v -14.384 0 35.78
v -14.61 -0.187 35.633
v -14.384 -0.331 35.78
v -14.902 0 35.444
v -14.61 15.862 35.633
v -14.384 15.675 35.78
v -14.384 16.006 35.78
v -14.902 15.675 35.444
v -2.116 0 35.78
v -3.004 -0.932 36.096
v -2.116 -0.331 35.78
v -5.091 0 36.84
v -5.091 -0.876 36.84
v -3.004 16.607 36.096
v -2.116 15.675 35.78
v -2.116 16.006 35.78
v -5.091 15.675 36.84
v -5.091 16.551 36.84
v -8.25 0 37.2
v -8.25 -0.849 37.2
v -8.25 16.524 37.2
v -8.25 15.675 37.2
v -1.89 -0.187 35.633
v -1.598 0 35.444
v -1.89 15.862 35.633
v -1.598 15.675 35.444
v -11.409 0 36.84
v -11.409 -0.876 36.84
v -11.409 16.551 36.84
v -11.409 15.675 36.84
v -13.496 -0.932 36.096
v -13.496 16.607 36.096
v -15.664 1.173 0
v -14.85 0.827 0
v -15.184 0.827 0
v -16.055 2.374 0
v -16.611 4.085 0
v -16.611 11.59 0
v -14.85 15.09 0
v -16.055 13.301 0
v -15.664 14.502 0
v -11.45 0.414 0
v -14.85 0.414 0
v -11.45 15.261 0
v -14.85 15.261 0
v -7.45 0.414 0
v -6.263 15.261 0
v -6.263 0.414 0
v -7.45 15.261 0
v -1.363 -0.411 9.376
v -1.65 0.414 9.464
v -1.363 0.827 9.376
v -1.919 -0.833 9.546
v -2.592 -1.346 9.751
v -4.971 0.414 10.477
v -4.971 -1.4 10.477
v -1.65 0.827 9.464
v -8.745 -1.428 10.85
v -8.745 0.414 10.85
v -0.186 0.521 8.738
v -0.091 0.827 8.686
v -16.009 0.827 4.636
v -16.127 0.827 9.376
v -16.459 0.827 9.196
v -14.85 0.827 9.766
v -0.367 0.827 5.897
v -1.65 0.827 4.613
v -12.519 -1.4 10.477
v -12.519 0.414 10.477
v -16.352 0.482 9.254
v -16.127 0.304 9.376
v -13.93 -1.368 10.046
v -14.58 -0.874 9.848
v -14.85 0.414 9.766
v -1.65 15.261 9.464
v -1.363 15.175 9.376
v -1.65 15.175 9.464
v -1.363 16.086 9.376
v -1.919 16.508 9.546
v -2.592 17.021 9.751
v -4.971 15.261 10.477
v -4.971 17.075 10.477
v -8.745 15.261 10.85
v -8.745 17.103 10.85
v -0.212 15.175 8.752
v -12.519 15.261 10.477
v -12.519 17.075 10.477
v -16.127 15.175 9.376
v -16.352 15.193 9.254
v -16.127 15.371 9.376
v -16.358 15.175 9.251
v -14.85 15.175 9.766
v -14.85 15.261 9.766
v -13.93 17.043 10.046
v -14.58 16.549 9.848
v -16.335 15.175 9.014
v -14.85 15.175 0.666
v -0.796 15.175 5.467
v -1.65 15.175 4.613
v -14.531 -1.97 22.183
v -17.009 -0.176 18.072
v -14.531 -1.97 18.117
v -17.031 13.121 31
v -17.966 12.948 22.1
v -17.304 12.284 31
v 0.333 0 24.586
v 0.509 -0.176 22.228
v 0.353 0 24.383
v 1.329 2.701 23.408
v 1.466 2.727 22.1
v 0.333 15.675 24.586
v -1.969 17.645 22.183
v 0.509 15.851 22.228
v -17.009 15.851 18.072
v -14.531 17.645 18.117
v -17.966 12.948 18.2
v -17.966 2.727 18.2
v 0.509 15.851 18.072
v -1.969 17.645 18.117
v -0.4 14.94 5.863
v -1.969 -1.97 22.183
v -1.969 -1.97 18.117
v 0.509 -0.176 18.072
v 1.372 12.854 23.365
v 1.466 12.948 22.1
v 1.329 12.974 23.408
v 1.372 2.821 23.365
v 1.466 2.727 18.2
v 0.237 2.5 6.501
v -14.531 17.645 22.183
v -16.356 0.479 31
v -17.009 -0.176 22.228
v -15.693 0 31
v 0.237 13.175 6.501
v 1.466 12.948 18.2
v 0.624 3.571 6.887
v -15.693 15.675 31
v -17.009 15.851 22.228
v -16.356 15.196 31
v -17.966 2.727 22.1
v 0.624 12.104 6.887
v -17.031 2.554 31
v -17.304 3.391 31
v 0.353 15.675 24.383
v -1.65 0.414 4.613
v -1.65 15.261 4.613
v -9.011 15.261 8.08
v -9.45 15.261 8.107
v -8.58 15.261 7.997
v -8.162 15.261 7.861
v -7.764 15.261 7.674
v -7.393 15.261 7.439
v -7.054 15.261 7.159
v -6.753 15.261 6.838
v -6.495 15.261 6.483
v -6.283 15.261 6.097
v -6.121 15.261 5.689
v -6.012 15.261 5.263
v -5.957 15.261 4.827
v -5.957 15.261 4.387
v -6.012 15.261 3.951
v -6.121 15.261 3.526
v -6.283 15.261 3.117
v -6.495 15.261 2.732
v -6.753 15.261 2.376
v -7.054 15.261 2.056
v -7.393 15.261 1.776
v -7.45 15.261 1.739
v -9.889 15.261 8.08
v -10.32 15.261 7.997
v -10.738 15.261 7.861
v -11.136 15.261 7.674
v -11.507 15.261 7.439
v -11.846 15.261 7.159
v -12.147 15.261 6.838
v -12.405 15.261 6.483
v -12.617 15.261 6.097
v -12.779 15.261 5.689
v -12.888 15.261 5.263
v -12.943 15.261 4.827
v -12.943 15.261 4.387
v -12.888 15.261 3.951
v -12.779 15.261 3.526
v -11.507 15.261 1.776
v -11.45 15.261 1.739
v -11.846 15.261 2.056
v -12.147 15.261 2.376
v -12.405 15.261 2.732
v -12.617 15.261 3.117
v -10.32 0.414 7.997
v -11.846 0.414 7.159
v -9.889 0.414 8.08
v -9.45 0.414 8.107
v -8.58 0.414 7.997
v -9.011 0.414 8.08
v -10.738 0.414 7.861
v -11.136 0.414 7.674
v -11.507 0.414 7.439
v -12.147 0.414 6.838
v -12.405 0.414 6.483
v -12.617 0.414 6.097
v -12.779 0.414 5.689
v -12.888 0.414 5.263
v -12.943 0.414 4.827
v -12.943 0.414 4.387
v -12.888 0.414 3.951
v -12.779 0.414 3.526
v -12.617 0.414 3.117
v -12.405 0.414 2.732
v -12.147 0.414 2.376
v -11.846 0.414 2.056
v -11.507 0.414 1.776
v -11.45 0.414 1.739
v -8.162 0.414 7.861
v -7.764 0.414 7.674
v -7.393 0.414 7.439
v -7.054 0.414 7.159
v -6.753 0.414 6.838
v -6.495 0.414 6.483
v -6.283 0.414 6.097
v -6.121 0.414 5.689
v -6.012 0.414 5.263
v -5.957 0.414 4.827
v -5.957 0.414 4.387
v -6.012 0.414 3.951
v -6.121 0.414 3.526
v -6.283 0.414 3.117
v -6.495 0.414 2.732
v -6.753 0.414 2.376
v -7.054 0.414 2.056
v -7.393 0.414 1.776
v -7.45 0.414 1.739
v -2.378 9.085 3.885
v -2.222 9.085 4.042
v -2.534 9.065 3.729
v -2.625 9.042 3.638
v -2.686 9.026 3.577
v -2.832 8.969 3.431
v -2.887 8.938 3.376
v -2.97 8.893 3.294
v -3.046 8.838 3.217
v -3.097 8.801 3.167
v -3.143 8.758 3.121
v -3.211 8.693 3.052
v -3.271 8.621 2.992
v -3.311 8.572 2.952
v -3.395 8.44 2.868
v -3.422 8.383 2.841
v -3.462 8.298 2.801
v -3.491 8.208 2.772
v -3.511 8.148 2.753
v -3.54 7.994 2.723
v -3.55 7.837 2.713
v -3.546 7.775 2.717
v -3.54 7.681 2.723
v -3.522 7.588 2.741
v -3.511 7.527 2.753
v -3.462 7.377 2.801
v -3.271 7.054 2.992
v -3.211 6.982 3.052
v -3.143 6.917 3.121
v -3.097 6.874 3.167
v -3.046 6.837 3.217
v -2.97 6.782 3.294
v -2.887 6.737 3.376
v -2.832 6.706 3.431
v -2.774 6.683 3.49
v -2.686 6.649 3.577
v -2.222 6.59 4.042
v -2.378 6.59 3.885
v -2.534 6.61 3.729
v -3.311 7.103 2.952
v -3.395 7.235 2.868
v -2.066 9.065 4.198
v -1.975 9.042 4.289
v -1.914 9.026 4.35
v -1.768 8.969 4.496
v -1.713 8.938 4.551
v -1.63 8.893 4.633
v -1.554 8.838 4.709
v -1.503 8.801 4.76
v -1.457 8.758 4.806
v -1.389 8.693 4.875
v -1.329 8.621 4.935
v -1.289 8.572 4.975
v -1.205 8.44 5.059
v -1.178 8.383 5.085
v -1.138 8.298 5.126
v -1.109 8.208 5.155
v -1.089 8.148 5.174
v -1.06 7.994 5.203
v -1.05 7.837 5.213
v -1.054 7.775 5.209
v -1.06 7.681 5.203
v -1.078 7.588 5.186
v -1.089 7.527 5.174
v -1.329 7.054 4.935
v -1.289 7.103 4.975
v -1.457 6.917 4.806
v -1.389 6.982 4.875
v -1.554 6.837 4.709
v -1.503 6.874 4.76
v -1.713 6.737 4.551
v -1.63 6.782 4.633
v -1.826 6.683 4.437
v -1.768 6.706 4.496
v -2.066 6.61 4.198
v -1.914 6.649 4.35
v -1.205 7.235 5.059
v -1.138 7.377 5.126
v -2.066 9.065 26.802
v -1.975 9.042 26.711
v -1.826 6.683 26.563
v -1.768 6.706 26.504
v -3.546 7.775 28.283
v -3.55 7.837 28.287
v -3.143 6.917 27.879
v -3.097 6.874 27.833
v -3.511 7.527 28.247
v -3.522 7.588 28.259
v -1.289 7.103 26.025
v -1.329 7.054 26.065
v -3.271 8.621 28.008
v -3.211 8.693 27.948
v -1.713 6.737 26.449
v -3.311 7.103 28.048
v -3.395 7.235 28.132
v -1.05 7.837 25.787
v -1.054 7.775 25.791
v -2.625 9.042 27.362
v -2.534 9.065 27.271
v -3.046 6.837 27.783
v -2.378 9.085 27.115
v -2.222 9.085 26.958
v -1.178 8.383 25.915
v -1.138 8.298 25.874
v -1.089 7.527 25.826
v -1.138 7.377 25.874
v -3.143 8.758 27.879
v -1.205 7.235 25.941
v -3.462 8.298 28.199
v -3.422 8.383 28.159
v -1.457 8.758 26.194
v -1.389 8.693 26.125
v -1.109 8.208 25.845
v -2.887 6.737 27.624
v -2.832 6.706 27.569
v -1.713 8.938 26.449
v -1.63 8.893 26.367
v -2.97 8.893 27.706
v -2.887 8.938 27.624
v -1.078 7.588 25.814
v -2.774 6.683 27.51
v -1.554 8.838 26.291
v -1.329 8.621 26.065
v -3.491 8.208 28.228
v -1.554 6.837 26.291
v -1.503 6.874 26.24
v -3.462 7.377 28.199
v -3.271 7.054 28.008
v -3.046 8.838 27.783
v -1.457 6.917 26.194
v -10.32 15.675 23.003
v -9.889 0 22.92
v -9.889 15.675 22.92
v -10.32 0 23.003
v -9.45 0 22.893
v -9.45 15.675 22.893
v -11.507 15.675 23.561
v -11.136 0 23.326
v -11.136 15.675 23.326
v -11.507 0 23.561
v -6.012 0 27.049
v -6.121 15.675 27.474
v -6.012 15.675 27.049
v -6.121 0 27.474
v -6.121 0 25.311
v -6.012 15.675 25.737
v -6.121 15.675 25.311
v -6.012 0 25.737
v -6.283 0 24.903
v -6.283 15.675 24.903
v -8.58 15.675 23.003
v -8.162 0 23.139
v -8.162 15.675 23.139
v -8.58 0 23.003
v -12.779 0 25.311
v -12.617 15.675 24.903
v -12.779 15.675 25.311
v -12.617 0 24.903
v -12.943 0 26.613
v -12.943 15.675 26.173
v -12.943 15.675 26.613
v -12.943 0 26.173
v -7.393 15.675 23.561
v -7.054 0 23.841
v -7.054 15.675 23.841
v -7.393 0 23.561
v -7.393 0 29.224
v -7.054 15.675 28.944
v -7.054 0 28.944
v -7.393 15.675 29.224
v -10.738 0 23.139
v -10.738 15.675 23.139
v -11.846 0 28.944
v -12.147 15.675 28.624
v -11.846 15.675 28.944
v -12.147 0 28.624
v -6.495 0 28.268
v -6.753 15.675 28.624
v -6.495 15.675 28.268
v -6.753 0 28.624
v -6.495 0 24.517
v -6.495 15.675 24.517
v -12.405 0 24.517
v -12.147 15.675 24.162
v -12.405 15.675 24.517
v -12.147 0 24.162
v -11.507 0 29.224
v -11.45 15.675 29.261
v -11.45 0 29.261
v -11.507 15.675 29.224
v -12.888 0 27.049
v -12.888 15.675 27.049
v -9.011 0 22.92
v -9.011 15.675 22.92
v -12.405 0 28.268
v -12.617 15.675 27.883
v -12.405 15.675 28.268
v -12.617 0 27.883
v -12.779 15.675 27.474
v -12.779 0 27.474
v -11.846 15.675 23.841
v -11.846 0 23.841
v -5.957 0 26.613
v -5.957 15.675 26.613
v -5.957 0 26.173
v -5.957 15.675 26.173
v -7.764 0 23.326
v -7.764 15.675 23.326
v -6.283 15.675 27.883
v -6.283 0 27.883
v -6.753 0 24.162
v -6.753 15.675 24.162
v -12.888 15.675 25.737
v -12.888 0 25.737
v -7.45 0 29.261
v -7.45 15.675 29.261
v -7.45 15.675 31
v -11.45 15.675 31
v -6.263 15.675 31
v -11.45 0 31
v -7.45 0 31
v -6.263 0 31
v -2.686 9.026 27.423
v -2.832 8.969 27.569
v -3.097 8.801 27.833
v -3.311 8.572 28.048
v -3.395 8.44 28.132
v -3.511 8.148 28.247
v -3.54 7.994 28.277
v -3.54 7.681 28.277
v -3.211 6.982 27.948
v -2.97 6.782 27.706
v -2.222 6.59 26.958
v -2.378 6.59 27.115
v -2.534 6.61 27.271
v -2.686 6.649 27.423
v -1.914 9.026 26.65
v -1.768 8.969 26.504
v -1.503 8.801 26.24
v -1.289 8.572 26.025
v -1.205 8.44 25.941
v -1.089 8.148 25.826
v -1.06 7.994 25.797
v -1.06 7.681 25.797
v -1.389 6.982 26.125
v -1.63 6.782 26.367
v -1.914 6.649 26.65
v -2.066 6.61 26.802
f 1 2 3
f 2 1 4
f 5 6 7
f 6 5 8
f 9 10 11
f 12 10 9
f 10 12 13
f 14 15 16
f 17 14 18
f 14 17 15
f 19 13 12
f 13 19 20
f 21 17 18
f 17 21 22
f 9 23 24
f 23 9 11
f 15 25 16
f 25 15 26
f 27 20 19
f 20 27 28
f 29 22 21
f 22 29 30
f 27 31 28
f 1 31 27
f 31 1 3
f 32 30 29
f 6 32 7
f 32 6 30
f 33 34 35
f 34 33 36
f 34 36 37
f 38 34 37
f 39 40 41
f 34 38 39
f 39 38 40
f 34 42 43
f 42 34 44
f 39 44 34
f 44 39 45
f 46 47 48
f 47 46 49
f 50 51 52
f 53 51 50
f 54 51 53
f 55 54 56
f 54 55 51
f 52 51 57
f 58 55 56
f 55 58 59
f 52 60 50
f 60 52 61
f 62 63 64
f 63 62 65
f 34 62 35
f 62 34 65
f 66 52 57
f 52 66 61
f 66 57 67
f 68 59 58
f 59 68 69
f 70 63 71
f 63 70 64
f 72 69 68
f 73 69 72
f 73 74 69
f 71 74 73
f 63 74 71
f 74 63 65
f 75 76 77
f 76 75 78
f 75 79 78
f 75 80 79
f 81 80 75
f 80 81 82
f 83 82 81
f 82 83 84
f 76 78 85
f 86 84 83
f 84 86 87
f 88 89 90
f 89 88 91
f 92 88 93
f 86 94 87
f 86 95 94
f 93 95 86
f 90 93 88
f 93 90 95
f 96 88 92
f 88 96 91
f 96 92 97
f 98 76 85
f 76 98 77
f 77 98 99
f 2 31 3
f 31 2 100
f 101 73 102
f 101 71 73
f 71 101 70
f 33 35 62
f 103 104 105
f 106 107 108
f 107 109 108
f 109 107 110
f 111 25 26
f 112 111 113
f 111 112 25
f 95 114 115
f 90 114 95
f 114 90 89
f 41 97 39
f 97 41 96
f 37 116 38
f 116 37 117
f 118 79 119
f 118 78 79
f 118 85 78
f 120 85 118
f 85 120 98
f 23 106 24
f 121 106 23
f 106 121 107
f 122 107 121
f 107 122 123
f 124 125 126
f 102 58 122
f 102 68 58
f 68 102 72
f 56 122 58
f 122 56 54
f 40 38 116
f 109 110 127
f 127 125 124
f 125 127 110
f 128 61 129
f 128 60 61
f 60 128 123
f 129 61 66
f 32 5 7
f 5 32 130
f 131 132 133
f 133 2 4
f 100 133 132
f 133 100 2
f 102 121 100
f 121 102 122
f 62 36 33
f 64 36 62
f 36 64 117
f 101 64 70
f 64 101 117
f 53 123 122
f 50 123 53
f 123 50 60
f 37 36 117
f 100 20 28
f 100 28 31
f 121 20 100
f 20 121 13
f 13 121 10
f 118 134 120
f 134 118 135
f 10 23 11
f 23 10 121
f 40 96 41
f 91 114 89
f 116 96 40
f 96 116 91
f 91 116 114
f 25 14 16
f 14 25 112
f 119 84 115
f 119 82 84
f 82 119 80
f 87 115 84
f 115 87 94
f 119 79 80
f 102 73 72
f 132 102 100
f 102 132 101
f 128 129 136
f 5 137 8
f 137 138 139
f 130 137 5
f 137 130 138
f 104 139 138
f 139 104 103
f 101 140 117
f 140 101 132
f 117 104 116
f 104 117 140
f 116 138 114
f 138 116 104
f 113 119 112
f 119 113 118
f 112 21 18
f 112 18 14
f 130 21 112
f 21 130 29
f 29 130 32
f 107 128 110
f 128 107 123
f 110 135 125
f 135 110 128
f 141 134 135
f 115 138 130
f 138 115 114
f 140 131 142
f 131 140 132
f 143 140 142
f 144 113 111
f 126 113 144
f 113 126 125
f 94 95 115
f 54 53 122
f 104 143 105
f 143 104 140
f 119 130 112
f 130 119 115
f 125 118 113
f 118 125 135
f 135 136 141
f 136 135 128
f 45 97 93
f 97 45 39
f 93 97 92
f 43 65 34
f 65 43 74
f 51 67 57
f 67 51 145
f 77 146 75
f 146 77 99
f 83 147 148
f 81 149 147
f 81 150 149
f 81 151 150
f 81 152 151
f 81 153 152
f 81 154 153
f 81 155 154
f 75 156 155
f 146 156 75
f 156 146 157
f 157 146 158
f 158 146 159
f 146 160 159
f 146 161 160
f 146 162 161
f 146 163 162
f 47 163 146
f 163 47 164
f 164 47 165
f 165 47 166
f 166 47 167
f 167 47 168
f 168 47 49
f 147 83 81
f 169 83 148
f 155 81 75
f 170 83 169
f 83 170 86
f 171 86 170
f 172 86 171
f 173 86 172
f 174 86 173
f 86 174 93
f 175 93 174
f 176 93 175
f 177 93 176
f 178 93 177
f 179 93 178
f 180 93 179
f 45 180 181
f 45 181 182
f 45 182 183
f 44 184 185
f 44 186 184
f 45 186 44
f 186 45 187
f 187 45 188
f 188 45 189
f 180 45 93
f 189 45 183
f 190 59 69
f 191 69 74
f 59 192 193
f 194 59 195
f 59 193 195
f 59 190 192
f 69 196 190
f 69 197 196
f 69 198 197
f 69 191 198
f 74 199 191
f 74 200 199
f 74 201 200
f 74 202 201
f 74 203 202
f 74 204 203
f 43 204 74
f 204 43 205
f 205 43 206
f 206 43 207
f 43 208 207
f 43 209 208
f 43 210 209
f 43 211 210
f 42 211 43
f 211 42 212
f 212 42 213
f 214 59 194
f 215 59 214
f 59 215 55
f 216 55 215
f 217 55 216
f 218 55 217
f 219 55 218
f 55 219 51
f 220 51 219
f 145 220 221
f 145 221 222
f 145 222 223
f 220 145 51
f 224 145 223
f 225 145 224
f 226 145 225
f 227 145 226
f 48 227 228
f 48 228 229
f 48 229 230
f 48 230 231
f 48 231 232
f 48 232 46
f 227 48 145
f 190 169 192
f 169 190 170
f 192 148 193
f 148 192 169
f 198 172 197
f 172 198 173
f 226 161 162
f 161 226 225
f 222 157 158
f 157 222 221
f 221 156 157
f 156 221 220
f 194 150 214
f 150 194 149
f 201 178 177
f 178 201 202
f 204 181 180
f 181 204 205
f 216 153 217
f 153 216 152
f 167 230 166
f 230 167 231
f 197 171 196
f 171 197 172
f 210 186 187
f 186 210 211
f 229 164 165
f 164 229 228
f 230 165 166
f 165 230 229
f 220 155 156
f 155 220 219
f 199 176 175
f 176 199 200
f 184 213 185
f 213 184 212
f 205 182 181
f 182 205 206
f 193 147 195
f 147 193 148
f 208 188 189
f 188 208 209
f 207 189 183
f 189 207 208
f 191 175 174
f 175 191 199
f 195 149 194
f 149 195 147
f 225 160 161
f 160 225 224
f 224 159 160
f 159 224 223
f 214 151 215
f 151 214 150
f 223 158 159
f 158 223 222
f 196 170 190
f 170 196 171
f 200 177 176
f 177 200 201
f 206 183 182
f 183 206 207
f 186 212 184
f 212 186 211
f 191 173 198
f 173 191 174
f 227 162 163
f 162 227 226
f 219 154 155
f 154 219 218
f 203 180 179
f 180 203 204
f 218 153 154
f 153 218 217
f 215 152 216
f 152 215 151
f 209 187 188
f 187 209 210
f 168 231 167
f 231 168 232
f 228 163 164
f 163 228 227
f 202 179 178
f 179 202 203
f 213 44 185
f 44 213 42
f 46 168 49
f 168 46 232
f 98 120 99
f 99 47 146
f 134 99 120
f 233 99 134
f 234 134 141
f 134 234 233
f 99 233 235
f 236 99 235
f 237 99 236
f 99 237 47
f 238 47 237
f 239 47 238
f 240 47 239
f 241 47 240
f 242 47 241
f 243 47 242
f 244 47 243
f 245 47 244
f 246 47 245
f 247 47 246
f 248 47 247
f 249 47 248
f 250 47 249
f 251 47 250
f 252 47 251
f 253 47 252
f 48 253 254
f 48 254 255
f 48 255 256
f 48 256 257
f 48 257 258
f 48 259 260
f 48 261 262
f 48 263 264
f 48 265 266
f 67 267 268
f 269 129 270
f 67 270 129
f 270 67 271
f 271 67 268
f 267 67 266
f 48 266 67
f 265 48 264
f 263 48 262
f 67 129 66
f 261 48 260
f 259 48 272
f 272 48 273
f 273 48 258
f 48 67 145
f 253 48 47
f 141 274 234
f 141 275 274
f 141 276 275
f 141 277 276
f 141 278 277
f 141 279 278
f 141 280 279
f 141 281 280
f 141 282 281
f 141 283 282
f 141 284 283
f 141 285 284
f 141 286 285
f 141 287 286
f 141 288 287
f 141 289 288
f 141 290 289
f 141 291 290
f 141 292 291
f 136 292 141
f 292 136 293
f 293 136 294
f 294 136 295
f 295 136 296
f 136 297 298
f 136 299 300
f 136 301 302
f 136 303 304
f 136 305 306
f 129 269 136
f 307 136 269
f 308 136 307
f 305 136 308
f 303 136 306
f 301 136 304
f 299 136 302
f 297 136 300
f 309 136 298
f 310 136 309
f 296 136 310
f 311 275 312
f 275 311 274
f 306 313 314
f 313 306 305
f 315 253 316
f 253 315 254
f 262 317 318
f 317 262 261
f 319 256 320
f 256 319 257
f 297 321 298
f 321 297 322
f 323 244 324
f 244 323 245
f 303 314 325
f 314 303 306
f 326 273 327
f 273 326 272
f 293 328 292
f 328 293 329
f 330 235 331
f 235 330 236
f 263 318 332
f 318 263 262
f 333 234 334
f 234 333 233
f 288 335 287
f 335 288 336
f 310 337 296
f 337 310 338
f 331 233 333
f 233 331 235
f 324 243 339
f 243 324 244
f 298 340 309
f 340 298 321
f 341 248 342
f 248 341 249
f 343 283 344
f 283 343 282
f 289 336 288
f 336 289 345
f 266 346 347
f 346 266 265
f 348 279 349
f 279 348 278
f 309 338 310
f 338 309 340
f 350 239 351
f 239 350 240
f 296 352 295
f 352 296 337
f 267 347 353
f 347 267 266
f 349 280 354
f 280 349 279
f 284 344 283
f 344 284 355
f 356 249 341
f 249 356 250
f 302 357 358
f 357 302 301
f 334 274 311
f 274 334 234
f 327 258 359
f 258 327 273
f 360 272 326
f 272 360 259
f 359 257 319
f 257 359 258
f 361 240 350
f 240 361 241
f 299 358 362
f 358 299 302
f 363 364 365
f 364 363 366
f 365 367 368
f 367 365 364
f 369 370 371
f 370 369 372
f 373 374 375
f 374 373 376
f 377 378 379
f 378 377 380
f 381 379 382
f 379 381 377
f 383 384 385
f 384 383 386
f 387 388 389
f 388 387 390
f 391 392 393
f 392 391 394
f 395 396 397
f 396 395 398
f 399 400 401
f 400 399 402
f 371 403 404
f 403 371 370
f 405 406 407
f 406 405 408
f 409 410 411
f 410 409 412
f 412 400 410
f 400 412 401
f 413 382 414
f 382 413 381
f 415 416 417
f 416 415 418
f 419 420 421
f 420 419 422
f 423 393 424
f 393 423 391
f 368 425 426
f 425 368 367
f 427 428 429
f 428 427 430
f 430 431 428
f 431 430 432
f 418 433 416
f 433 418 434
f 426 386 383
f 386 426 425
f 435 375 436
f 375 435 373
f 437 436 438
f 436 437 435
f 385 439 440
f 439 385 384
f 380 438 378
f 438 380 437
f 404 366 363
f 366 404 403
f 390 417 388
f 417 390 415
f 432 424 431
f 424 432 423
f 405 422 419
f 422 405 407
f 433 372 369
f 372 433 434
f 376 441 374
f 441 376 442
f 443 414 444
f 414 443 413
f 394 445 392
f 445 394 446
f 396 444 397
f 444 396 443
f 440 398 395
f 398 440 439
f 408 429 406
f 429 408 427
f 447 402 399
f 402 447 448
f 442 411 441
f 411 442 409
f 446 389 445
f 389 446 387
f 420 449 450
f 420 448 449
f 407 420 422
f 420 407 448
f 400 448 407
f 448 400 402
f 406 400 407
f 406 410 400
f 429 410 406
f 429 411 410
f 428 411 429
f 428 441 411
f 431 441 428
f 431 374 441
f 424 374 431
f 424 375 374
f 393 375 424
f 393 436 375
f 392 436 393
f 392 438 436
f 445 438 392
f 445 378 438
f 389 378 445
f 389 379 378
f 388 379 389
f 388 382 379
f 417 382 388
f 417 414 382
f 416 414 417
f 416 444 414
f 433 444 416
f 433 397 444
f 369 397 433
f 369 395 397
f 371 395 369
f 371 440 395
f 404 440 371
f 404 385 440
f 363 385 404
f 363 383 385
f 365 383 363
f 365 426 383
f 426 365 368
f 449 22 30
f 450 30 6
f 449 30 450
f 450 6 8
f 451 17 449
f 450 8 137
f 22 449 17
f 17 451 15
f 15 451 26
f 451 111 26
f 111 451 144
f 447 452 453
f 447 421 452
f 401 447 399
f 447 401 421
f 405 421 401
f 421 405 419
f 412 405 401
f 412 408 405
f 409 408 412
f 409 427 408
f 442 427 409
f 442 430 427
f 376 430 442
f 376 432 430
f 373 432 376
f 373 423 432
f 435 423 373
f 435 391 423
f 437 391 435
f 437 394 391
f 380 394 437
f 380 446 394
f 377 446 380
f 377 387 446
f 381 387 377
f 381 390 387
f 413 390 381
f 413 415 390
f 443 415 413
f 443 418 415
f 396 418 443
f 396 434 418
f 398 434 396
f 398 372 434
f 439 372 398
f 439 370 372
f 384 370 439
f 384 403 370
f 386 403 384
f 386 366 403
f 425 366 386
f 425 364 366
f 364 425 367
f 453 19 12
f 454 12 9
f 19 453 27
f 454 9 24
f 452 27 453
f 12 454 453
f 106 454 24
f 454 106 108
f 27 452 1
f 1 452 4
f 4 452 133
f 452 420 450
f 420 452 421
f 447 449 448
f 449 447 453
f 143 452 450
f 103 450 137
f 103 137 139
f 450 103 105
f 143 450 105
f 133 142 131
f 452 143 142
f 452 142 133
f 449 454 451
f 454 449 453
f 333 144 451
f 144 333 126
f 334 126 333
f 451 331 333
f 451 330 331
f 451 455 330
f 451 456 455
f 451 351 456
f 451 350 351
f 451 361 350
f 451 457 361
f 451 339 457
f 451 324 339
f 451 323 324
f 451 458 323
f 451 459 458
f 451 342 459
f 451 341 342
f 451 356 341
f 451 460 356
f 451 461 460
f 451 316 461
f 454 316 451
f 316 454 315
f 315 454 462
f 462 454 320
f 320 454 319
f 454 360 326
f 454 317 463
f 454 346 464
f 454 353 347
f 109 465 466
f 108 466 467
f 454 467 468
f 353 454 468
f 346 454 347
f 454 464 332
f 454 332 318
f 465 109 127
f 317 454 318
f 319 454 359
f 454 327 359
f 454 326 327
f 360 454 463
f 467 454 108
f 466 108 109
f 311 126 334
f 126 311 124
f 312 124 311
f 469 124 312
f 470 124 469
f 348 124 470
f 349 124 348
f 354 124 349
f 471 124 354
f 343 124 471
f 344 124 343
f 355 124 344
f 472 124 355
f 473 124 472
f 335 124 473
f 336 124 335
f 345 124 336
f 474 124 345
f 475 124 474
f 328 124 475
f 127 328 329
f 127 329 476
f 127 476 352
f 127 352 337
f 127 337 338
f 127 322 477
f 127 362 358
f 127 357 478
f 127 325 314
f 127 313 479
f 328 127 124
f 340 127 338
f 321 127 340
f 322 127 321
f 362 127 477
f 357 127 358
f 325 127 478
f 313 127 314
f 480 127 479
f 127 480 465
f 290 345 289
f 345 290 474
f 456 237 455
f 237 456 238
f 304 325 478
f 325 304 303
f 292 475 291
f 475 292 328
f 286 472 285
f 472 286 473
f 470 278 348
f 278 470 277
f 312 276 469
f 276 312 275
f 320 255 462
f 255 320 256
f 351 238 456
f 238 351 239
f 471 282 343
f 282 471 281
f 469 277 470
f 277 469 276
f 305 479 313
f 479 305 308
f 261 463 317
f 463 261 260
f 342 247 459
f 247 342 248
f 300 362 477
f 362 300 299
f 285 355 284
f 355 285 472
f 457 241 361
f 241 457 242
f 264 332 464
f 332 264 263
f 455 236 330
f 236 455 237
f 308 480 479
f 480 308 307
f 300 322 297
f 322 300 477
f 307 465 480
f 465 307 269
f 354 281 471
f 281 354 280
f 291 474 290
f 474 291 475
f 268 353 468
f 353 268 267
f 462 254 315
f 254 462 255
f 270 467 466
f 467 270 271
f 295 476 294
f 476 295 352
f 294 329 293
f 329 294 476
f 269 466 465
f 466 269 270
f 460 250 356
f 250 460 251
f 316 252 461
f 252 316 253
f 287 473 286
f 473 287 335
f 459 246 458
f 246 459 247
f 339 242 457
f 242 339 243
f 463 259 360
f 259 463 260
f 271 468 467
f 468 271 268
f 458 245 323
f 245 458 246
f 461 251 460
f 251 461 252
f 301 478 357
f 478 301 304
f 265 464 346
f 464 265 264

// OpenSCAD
// file: ../../config.scad
/**
 * Configuration settings for Flexy Beast, required to generate correctly sized STLs of the printed parts. See the Configuration File Assembly instructions to set this up.
 * @id config_file
 * @name Configuration File
 * @category Prerequisites!
 * @step Open config.scad in your favorite text editor.
 * @step As per the normal Cyborg Beast instructions, measure the width of the knuckles in the non-affected hand and convert to millimeters.
 * @step Add 5 to that result and then divide by 55.
 * @step Replace the x-, y-, and zScaleFactor variables in config.scad with that number.
 * @step If desired, adjust the proportions of the hand by changing those variables individually. xScaleFactor controls the width of the hand, yScaleFactor controls the length, and zScaleFactor controls the height.
 * @step Open assembly.scad in OpenSCAD to check that the flexy joint holes are not too large for the hand (should only be necessary for small children). If necessary, reduce the jointDia and jointThick variables. jointDia=5 and jointThick=2 is a good amount for smaller hands.
 * @step Set the fingerPads variable to true or false depending on whether you want to cast silicone finger pads for improved grip.
 * @step Open palm.scad, finger_base.scad, finger_tip.scad, and thumb_tip.scad in OpenSCAD, render each part (F6), and export as STL, then print. Suggested print settings are 0.2mm or smaller layer height, 3 perimeters, and 25% rectilinear or hexagonal infill.
 */

knuckleR = 4.85;
knucklePadding = 0.5;
knuckleW = 9.5;
wristH = 10;
palmH = 20;
palmW = 64;
th = 3;
fn = 32;

//flexy joint parameters
jointDia = 7;
jointThick = 4;

//finger settings
fingerPads = true; //whether or not to hollow the finger tips slightly for molding pads
fingerLength = 1; //multiply the length of all fingers by this amount
thumbProp = 0.8; //proportion of thumb length relative to other fingers (note that the thumb is a segment shorter than the other fingers already)
indexProp = 0.8; //proportion of index finger length relative to other fingers
middleProp = 1; //proportion of middle finger length relative to other fingers
ringProp = 0.8; //proportion of ring finger length relative to other fingers
pinkyProp = 0.7; //proportion of pinky finger length relative to other fingers

//misc settings
thermoform = true; //whether or not to generate a thermoformable mesh for the palm

//desired scale factor for hand based on the standard Cyborg Beast/Robohand sizing guide
xScaleFactor = 1.65; // [1.05:1.60]
yScaleFactor = 1.55; // [1.05:1.60]
zScaleFactor = 1.65; // [1.05:1.60]
// main file
include <../../config.scad>

rotate([0,-90,0]) fingerbase();

//	Base segment of finger, can be lengthened
module fingerbase(length=20, proximalHole=true, distalHole=true)
{
	difference() {
		scale([yScaleFactor,xScaleFactor,zScaleFactor]) {
			fingerbasesolid(length);
		}
		if(proximalHole) {
			translate([0,knucklePadding/2 * xScaleFactor,0]) fingerhardwarecutouts(jointDia, jointThick, knuckleW=knuckleW-knucklePadding, fingerLen=length);
		}
		if (distalHole) {
			translate([length * yScaleFactor,0,0]) mirror([1,0,0]) fingerhardwarecutouts(jointDia, jointThick, knuckleW=knuckleW, fingerLen=length);
		}
	}


	
}

module fingerhardwarecutouts(jointDia,jointThick,knuckleW,fingerLen,holeCutoff=100) {
	//slot for flex joint
	translate([7 - (15/jointDia),0,6*zScaleFactor - (1.8/jointThick)]) {
		rotate([90,0,0]) translate([-0.25,0,-knuckleW*xScaleFactor]) cylinder(d=jointDia, h=knuckleW*xScaleFactor, $fn=50);
		translate([-25,(knuckleW*xScaleFactor) / 2,0]) cube([50,knuckleW*xScaleFactor,jointThick], center=true);
	}
	//cubic parts
	translate([-100,0,0]) cube([100,knuckleW*xScaleFactor,100]);
	translate([-13/zScaleFactor,0,0]) rotate([0,45,0]) translate([-50,0,0]) cube([100,knuckleW * xScaleFactor, 10]);

	//channel for string/tendon
	translate([-fingerLen/2 * yScaleFactor, knuckleW/2 * xScaleFactor, 2.3]) rotate([0,90,0]) cylinder(d=2.5, h=holeCutoff, $fn=50);
}

//	base segment of finger, solid
module fingerbasesolid(length=50, cutout=true) {
	difference() {
		//cubic part
		translate([0,0.001 + knucklePadding/2,1]) cube([length, knuckleW - knucklePadding - 0.002, 8]);
	}
	
	//cylindrical-ish part around finger
	intersection() {
		//overly large shape to get the cross section in the XZ plane from
		difference() {
			union() {
				translate([length-4,-5,5]) rotate([-90,0,0]) cylinder(r=8,h=knuckleW + 10);
				translate([0,-5,-5]) cube([length,knuckleW + 10,20]);
			}
			//cutout for the side "guards" of the previous knuckle
			if(cutout) {
				translate([-4,-knuckleW+0.001,5.3]) rotate([-90,0,0]) cylinder(r=11,h=10);
				translate([-4,knuckleW - knucklePadding*(1/xScaleFactor),5.3]) rotate([-90,0,0]) cylinder(r=11,h=10);
			}
		}

		hull() {
			for(i=[-1,1], j=[-1,1]) {
				//angled cylinders to provide the outer shape of the finger
				translate([length/10,i*2.4 + knuckleW/2,j*2.2 + 5]) rotate([i*j*-4,j*86,0]) cylinder(d=6,h=20,center=true);
				translate([length+4, i*2.4 + knuckleW/2, j*2.2 + 5]) rotate([i*j*-4,j*-86,0]) cylinder(d=6,h=20,center=true);
			}
		}
	}
}
